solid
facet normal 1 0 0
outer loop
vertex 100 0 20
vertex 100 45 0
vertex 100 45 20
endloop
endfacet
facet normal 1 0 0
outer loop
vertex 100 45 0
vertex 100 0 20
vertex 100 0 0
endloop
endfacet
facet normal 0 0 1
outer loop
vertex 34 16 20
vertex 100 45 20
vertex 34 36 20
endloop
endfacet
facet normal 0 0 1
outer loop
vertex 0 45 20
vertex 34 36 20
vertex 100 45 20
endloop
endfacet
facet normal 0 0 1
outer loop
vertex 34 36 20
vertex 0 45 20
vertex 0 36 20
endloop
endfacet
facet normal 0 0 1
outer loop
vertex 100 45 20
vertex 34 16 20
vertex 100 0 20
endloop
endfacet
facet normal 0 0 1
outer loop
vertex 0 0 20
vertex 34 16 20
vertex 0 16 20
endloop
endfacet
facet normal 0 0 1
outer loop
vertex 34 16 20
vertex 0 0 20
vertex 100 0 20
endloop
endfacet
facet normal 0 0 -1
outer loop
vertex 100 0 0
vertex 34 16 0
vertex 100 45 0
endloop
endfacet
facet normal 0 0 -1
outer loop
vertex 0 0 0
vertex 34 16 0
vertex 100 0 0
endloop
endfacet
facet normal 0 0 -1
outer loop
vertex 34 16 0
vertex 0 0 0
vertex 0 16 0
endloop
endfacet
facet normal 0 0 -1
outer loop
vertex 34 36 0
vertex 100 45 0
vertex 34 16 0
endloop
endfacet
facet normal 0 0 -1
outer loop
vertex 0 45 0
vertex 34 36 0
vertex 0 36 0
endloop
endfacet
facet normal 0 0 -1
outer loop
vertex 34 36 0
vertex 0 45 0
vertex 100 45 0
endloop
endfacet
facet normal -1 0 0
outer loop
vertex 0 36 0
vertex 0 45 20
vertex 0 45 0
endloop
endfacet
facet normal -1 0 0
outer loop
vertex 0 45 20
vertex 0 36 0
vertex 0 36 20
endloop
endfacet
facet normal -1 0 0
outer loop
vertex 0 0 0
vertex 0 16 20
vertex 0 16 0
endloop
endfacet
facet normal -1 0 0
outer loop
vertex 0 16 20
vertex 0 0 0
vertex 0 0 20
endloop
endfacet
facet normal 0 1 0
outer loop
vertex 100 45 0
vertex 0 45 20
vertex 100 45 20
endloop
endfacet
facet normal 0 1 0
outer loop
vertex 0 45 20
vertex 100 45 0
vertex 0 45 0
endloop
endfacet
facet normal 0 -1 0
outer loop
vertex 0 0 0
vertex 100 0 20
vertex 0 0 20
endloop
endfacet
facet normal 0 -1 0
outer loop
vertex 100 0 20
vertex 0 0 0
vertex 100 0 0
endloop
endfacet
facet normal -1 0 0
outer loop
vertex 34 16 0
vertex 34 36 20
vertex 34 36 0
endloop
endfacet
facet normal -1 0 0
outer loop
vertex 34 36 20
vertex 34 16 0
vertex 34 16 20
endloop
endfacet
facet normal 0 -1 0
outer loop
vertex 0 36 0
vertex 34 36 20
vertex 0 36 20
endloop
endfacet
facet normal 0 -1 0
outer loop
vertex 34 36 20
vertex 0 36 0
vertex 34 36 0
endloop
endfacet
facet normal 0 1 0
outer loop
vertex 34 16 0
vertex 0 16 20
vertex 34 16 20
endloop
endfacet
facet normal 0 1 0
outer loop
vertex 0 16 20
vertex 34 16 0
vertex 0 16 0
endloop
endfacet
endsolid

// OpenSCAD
difference()
{
	cube([100,45,20]);
	translate([-1,16,-1]) cube([35,20,25]);
}
